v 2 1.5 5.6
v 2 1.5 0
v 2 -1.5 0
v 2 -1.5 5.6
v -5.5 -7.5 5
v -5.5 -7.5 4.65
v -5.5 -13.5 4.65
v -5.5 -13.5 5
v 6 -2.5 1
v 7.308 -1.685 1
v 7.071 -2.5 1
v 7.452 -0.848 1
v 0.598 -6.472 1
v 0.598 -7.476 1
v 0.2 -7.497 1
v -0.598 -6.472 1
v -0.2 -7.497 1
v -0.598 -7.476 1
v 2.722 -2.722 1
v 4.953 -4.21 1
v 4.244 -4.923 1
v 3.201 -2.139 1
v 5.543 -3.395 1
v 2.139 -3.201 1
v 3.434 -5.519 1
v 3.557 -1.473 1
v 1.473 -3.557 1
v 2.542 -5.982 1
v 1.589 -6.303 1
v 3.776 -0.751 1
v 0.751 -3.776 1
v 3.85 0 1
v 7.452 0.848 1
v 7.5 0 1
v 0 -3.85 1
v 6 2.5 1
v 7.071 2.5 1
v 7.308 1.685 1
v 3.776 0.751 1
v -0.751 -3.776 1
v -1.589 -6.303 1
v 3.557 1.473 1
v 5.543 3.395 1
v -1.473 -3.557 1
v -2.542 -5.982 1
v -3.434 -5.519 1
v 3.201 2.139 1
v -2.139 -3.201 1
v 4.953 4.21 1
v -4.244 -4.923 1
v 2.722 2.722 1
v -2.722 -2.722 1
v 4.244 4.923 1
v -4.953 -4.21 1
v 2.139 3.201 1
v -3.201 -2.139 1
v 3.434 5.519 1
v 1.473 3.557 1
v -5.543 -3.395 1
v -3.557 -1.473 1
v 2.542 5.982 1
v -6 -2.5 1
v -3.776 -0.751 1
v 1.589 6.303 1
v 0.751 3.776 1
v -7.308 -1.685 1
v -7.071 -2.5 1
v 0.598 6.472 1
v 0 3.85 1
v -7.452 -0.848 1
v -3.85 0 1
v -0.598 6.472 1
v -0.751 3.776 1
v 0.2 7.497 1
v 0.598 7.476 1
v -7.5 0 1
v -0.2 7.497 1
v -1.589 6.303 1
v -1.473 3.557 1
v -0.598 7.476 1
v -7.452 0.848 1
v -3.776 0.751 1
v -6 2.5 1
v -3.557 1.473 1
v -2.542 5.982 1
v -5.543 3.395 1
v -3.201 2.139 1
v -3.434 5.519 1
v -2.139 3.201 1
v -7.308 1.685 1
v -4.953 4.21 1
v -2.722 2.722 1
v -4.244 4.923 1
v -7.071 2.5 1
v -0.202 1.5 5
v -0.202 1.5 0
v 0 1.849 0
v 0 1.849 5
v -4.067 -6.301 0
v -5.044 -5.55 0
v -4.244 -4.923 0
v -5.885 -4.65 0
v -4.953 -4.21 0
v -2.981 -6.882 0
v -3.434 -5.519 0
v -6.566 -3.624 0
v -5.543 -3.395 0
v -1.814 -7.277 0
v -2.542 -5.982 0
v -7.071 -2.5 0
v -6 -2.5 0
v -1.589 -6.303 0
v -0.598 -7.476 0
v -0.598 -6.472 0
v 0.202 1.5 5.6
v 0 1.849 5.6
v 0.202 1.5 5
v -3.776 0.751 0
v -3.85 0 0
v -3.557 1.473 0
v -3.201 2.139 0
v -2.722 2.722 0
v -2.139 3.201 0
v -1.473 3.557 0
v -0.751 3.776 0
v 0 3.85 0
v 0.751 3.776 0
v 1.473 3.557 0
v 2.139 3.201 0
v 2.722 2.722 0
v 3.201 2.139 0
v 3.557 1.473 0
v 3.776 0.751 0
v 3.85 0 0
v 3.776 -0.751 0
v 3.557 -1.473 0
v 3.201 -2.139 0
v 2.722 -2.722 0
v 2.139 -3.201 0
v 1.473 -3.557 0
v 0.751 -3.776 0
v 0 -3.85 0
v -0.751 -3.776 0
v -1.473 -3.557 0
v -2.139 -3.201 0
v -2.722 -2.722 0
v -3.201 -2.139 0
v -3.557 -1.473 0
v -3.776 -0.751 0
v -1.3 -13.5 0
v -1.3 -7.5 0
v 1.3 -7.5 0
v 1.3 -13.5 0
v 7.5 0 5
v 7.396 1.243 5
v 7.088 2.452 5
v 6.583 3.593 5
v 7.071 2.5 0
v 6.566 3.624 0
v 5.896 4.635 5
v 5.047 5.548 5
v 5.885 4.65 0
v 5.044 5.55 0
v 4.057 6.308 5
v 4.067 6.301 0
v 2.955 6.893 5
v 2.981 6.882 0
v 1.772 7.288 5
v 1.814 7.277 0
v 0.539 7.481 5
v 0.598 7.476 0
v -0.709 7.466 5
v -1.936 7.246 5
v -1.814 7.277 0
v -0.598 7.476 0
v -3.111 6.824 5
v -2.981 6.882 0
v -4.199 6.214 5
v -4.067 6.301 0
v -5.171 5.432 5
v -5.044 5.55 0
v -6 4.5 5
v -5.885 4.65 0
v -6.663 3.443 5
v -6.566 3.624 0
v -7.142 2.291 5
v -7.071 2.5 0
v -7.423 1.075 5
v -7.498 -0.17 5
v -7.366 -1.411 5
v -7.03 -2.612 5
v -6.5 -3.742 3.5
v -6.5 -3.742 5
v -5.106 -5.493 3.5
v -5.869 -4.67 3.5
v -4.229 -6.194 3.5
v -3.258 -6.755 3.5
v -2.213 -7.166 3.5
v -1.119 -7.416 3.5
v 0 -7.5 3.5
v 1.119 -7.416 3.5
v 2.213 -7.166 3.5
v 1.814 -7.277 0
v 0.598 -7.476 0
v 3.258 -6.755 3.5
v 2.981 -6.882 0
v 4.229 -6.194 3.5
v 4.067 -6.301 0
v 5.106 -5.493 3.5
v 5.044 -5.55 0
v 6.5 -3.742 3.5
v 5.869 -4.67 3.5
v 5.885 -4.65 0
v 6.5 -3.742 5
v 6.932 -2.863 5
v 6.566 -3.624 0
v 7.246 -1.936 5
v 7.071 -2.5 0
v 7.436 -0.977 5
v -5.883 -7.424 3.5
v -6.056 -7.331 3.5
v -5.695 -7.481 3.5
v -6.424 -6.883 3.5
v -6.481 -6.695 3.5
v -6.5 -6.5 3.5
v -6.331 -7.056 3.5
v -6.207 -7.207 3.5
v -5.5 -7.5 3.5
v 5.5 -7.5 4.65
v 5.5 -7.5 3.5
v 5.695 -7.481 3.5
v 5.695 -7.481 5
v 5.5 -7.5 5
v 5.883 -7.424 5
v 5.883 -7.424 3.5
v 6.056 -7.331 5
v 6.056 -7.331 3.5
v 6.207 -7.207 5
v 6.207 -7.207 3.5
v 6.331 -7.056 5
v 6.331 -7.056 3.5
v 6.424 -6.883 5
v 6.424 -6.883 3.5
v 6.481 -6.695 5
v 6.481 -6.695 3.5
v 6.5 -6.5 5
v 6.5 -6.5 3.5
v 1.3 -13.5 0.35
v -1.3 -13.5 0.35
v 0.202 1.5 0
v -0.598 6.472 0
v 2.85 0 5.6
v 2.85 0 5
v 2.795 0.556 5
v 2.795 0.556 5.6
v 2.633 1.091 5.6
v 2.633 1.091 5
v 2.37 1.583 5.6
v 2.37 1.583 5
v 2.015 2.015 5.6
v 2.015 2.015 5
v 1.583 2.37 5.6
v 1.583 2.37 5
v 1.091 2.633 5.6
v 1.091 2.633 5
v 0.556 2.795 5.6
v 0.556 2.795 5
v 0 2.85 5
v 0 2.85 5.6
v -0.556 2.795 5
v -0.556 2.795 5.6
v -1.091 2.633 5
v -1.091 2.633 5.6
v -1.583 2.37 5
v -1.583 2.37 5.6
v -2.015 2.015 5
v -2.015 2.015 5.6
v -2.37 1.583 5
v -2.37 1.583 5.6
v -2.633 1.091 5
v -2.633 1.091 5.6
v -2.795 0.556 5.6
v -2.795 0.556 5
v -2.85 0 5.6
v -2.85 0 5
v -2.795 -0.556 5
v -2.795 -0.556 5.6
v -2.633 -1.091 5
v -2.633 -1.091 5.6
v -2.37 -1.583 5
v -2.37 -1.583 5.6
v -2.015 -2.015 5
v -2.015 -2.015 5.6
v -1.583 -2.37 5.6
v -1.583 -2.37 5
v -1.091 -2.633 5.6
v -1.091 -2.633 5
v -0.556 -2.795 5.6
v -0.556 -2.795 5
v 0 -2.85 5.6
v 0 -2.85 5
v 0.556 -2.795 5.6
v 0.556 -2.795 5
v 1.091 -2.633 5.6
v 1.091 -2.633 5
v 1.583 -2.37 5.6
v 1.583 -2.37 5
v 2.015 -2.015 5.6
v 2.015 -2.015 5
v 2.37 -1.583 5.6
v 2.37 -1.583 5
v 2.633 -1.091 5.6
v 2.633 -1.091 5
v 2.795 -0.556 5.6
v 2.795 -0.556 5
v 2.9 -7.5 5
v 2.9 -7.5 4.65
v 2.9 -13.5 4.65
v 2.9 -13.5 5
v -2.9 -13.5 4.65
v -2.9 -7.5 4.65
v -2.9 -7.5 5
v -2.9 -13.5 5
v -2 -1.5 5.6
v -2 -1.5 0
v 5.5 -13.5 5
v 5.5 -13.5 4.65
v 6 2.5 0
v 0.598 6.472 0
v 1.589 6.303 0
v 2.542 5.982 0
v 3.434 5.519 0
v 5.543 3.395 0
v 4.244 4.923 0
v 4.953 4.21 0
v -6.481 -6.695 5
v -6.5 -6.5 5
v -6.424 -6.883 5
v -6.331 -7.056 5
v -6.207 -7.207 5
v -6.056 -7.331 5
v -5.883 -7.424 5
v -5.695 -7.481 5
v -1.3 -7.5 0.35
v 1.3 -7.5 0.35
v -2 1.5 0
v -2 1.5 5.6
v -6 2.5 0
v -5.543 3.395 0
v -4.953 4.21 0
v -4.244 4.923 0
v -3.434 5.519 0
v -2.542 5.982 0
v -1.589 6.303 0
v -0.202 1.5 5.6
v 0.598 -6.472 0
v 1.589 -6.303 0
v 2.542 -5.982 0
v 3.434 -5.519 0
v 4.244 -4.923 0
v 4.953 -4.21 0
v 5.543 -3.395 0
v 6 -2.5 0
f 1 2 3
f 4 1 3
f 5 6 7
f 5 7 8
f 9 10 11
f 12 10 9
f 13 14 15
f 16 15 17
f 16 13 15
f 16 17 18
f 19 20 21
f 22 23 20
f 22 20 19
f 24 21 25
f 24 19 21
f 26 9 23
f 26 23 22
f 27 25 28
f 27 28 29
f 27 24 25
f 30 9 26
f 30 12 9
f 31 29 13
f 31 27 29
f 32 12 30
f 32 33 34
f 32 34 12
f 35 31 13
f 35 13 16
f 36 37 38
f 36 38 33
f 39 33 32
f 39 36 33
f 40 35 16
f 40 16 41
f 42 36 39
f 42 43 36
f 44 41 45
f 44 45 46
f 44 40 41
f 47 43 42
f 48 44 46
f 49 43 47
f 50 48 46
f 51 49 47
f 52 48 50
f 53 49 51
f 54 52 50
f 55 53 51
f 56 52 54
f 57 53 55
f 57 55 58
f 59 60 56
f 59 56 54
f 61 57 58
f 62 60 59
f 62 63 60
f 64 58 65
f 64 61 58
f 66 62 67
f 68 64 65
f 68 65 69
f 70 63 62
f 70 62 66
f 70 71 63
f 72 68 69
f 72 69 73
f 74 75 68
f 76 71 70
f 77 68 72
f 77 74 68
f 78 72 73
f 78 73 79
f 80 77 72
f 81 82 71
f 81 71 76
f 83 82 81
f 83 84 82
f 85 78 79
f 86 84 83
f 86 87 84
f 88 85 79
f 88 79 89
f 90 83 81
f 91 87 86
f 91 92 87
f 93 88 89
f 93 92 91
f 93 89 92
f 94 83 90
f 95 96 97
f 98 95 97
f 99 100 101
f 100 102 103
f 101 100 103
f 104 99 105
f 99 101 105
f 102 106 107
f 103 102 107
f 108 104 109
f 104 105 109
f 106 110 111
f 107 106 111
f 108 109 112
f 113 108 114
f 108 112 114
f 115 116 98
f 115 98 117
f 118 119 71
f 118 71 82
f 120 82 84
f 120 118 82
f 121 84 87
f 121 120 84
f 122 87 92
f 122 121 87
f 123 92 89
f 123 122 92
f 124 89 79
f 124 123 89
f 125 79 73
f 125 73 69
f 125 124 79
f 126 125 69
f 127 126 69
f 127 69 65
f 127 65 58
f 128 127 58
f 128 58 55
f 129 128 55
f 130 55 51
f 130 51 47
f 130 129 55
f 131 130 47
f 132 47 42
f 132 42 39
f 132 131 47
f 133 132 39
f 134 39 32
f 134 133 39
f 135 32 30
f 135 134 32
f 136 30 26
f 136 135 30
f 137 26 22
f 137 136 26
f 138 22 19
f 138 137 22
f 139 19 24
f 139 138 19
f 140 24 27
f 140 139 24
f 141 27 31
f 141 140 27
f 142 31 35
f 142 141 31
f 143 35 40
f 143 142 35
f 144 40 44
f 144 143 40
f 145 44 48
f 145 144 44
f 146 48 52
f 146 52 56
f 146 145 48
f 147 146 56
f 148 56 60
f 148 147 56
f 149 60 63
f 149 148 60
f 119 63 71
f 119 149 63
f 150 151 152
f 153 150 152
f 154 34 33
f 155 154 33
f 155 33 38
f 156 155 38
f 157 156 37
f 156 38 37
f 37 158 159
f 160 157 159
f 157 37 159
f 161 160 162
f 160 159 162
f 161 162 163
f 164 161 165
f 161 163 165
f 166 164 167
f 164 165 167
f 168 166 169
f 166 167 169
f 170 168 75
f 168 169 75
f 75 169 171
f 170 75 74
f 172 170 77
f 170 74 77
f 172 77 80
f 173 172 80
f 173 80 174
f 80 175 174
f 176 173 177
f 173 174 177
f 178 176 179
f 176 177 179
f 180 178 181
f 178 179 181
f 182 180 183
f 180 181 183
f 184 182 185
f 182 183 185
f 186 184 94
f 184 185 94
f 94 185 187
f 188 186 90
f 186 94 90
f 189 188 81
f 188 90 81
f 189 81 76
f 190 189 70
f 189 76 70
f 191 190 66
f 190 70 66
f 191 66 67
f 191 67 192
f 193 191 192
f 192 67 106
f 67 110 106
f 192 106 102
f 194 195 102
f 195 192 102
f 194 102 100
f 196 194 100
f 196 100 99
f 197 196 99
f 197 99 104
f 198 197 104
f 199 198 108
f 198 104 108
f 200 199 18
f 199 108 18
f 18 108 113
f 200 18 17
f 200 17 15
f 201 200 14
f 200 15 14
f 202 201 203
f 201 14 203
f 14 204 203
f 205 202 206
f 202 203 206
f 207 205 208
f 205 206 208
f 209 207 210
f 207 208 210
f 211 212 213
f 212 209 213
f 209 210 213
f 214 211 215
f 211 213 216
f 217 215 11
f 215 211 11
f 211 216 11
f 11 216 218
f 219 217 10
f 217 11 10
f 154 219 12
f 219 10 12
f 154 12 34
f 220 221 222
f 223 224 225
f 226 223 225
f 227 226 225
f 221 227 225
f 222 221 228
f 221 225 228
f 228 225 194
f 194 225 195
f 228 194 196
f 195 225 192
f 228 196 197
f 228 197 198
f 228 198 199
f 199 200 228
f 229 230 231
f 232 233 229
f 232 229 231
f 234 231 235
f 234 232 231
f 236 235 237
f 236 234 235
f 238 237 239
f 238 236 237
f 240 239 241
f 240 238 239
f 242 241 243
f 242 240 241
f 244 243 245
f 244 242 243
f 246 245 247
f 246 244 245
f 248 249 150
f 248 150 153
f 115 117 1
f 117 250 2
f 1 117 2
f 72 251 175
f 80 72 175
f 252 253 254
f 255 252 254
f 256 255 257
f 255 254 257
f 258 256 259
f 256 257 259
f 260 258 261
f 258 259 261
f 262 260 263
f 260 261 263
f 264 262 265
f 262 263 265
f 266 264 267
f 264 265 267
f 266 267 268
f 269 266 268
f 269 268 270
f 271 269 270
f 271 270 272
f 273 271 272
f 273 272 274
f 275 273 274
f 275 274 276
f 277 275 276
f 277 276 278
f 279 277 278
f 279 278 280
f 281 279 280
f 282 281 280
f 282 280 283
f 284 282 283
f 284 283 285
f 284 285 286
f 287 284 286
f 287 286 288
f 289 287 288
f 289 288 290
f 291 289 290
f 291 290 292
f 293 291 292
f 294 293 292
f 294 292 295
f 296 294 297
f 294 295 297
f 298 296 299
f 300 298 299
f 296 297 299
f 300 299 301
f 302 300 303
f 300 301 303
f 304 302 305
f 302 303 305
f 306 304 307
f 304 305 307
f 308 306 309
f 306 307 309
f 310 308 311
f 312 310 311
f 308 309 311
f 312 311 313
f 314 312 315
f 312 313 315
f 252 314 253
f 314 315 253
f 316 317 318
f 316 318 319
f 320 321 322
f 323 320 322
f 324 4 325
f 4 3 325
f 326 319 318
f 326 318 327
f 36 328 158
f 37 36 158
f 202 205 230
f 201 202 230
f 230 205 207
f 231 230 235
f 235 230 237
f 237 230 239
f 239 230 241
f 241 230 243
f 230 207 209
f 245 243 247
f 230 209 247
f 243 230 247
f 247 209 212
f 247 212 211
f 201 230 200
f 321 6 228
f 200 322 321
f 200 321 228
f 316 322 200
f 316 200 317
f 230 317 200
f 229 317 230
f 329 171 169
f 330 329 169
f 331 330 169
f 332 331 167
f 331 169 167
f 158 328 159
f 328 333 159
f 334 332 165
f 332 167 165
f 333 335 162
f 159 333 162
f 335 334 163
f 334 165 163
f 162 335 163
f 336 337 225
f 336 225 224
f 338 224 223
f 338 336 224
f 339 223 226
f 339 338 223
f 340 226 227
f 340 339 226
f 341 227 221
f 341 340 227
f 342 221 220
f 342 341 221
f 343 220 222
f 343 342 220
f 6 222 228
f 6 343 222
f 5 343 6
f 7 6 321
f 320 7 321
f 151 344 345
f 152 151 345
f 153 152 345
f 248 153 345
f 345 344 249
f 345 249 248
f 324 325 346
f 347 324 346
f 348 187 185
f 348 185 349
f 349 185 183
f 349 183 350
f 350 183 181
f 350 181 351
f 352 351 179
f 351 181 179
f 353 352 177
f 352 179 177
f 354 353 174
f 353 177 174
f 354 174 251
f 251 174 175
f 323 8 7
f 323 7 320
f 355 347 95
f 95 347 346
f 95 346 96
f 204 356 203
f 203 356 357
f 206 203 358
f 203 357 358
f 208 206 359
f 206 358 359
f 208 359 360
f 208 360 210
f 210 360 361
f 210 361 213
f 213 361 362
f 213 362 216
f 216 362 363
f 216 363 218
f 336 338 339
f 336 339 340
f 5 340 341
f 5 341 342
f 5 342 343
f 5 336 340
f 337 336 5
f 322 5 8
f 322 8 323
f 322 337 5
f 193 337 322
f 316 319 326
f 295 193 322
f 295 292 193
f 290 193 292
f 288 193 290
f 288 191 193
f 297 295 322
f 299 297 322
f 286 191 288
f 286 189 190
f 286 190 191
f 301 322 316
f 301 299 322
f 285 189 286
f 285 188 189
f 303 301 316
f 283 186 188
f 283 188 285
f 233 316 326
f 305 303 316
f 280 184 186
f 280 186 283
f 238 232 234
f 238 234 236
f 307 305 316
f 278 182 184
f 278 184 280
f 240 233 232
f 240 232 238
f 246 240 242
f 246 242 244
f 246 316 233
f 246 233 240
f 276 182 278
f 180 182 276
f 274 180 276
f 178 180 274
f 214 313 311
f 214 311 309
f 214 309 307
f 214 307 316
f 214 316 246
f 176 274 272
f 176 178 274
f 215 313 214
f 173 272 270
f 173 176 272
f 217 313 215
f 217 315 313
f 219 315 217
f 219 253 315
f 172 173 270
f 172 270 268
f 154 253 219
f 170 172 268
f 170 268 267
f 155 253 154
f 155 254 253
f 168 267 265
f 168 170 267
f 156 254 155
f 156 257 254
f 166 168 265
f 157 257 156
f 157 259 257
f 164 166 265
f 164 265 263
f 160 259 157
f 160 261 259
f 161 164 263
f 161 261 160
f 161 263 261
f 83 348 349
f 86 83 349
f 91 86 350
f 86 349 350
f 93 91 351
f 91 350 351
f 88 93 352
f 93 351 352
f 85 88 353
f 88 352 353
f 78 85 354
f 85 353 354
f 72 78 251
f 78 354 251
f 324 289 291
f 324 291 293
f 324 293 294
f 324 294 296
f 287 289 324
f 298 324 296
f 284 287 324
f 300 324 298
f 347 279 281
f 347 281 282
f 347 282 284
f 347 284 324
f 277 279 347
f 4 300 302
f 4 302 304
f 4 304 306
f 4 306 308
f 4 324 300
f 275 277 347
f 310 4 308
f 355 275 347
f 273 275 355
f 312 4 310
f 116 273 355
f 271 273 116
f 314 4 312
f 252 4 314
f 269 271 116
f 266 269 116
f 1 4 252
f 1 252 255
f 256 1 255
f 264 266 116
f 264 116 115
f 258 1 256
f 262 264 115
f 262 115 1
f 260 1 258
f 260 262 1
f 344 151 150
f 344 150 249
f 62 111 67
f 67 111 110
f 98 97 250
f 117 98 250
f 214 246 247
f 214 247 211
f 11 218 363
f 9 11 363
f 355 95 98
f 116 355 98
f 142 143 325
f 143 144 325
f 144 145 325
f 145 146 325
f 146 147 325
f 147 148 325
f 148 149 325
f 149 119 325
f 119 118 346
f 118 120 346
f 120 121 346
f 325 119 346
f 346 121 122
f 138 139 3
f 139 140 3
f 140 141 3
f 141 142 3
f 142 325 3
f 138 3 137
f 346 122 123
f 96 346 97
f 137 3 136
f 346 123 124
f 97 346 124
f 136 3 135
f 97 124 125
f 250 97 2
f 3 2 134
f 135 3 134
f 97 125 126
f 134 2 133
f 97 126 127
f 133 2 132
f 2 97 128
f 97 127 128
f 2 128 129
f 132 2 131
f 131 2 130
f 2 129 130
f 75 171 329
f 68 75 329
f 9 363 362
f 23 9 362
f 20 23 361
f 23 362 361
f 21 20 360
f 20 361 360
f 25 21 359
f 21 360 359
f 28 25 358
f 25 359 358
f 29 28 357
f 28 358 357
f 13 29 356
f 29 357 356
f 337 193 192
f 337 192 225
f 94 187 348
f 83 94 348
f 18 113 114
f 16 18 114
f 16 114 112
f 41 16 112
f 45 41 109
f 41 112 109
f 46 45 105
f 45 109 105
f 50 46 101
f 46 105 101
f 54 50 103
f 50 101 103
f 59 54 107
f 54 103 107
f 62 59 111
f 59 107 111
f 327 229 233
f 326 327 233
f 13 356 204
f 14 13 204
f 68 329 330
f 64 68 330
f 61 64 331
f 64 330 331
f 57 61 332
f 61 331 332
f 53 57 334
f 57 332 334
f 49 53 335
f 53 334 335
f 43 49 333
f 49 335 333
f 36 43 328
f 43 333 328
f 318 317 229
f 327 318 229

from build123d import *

# Parameters (mm, degrees)
SKETCH2_R           = 7.5
BOSS_EXTRUDE1_DEPTH = 5
SKETCH3_W           = 4
SKETCH3_H           = 3
CUT_EXTRUDE1_DEPTH  = 12.7260394
SKETCH4_R           = 3.85
CUT_EXTRUDE2_DEPTH  = 1
SKETCH7_R           = 2.85
BOSS_EXTRUDE2_DEPTH = 0.6
BOSS_EXTRUDE3_DEPTH = 1.5
SKETCH9_W           = 2.6
SKETCH9_H           = 0.35
BOSS_EXTRUDE4_DEPTH = 6


with BuildPart() as part:
    # Sketch2 → Boss-Extrude1 (new body)
    with BuildSketch(Plane.XY):
        Circle(SKETCH2_R)
    extrude(amount=BOSS_EXTRUDE1_DEPTH)

    # Sketch3 → Cut-Extrude1 (cut, through all)
    with BuildSketch(Plane(origin=(0, 0, 0), x_dir=(-1, 0, 0), z_dir=(0, 0, -1))):
        Polygon((0.302588522, 1.325300435), (0, 1.849399129), (-0.302588522, 1.325300435), align=None)
        Rectangle(SKETCH3_W, SKETCH3_H)
    extrude(amount=-CUT_EXTRUDE1_DEPTH, mode=Mode.SUBTRACT)

    # Sketch4 → Cut-Extrude2 (cut)
    # profile 1 of 9: a face of its own
    with BuildSketch(Plane(origin=(0, 0, 0), x_dir=(-1, 0, 0), z_dir=(0, 0, -1))):
        with BuildLine():
            Line((-7.071067812, -2.5), (-6, -2.5))
            ThreePointArc((-6, -2.5), (-6.5, 0), (-6, 2.5))
            Line((-6, 2.5), (-7.071067812, 2.5))
            ThreePointArc((-7.071067812, 2.5), (-7.5, 0), (-7.071067812, -2.5))
        make_face()
    # profile 2 of 9: a face of its own
    with BuildSketch(Plane(origin=(0, 0, 0), x_dir=(-1, 0, 0), z_dir=(0, 0, -1))):
        with BuildLine():
            Line((-6, -2.5), (-4.581631236, -2.5))
            Line((-4.581631236, -2.5), (-4.581631236, 2.5))
            Line((-4.581631236, 2.5), (-6, 2.5))
            ThreePointArc((-6, 2.5), (-6.5, 0), (-6, -2.5))
        make_face()
    # profile 3 of 9: a face of its own
    with BuildSketch(Plane(origin=(0, 0, 0), x_dir=(-1, 0, 0), z_dir=(0, 0, -1))):
        with BuildLine():
            Line((-4.581631236, 2.5), (-4.581631236, -2.5))
            Line((-4.581631236, -2.5), (-6, -2.5))
            ThreePointArc((-6, -2.5), (-3.850924227, -5.236447517), (-0.598372116, -6.472399154))
            Line((-0.598372116, -6.472399154), (-0.598372116, -5.084021936))
            Line((-0.598372116, -5.084021936), (0.598372116, -5.084021936))
            Line((0.598372116, -5.084021936), (0.598372116, -6.472399154))
            ThreePointArc((0.598372116, -6.472399154), (3.850924227, -5.236447517), (6, -2.5))
            Line((6, -2.5), (4.581631236, -2.5))
            Line((4.581631236, -2.5), (4.581631236, 2.5))
            Line((4.581631236, 2.5), (6, 2.5))
            ThreePointArc((6, 2.5), (3.850924227, 5.236447517), (0.598372116, 6.472399154))
            Line((0.598372116, 6.472399154), (0.598372116, 4.979496746))
            Line((0.598372116, 4.979496746), (-0.598372116, 4.979496746))
            Line((-0.598372116, 4.979496746), (-0.598372116, 6.472399154))
            ThreePointArc((-0.598372116, 6.472399154), (-3.850924227, 5.236447517), (-6, 2.5))
            Line((-6, 2.5), (-4.581631236, 2.5))
        make_face()
        Circle(SKETCH4_R, mode=Mode.SUBTRACT)
    # profile 4 of 9: a face of its own
    with BuildSketch(Plane(origin=(0, 0, 0), x_dir=(-1, 0, 0), z_dir=(0, 0, -1))):
        with BuildLine():
            ThreePointArc((0.598372116, 6.472399154), (0, 6.5), (-0.598372116, 6.472399154))
            Line((-0.598372116, 6.472399154), (-0.598372116, 4.979496746))
            Line((-0.598372116, 4.979496746), (0.598372116, 4.979496746))
            Line((0.598372116, 4.979496746), (0.598372116, 6.472399154))
        make_face()
    # profile 5 of 9: a face of its own
    with BuildSketch(Plane(origin=(0, 0, 0), x_dir=(-1, 0, 0), z_dir=(0, 0, -1))):
        with BuildLine():
            Line((-0.598372116, 7.476091948), (-0.598372116, 6.472399154))
            ThreePointArc((-0.598372116, 6.472399154), (0, 6.5), (0.598372116, 6.472399154))
            Line((0.598372116, 6.472399154), (0.598372116, 7.476091948))
            ThreePointArc((0.598372116, 7.476091948), (0, 7.5), (-0.598372116, 7.476091948))
        make_face()
    # profile 6 of 9: a face of its own
    with BuildSketch(Plane(origin=(0, 0, 0), x_dir=(-1, 0, 0), z_dir=(0, 0, -1))):
        with BuildLine():
            Line((4.581631236, -2.5), (6, -2.5))
            ThreePointArc((6, -2.5), (6.373774392, -1.274754878), (6.5, 0))
            ThreePointArc((6.5, 0), (6.373774392, 1.274754878), (6, 2.5))
            Line((6, 2.5), (4.581631236, 2.5))
            Line((4.581631236, 2.5), (4.581631236, -2.5))
        make_face()
    # profile 7 of 9: a face of its own
    with BuildSketch(Plane(origin=(0, 0, 0), x_dir=(-1, 0, 0), z_dir=(0, 0, -1))):
        with BuildLine():
            ThreePointArc((6.5, 0), (6.373774392, -1.274754878), (6, -2.5))
            Line((6, -2.5), (7.071067812, -2.5))
            ThreePointArc((7.071067812, -2.5), (7.391989197, -1.26826484), (7.5, 0))
            ThreePointArc((7.5, 0), (7.391989197, 1.26826484), (7.071067812, 2.5))
            Line((7.071067812, 2.5), (6, 2.5))
            ThreePointArc((6, 2.5), (6.373774392, 1.274754878), (6.5, 0))
        make_face()
    # profile 8 of 9: a face of its own
    with BuildSketch(Plane(origin=(0, 0, 0), x_dir=(-1, 0, 0), z_dir=(0, 0, -1))):
        with BuildLine():
            Line((-0.598372116, -5.084021936), (-0.598372116, -6.472399154))
            ThreePointArc((-0.598372116, -6.472399154), (0, -6.5), (0.598372116, -6.472399154))
            Line((0.598372116, -6.472399154), (0.598372116, -5.084021936))
            Line((0.598372116, -5.084021936), (-0.598372116, -5.084021936))
        make_face()
    # profile 9 of 9: a face of its own
    with BuildSketch(Plane(origin=(0, 0, 0), x_dir=(-1, 0, 0), z_dir=(0, 0, -1))):
        with BuildLine():
            ThreePointArc((0.598372116, -6.472399154), (0, -6.5), (-0.598372116, -6.472399154))
            Line((-0.598372116, -6.472399154), (-0.598372116, -7.476091948))
            ThreePointArc((-0.598372116, -7.476091948), (0, -7.5), (0.598372116, -7.476091948))
            Line((0.598372116, -7.476091948), (0.598372116, -6.472399154))
        make_face()
    extrude(amount=-CUT_EXTRUDE2_DEPTH, mode=Mode.SUBTRACT)

    # Sketch7 → Boss-Extrude2 (add)
    with BuildSketch(Plane.XY.offset(5)):
        Circle(SKETCH7_R)
        Polygon((2, -1.5), (-2, -1.5), (-2, 1.5), (-0.201725681, 1.5), (0, 1.849399129), (0.201725681, 1.5), (2, 1.5), align=None, mode=Mode.SUBTRACT)
    extrude(amount=BOSS_EXTRUDE2_DEPTH)

    # Sketch8 → Boss-Extrude3 (add)
    with BuildSketch(Plane.XY.offset(5)):
        with BuildLine():
            Line((-5.5, -7.5), (5.5, -7.5))
            ThreePointArc((5.5, -7.5), (6.207106781, -7.207106781), (6.5, -6.5))
            Line((6.5, -6.5), (6.5, -2.85))
            Line((6.5, -2.85), (-6.5, -2.85))
            Line((-6.5, -2.85), (-6.5, -6.5))
            ThreePointArc((-6.5, -6.5), (-6.207106781, -7.207106781), (-5.5, -7.5))
        make_face()
    extrude(amount=-BOSS_EXTRUDE3_DEPTH)

    # Sketch9 → Boss-Extrude4 (add)
    with BuildSketch(Plane.XZ.offset(7.5)):
        with Locations((0, 0.175)):
            Rectangle(SKETCH9_W, SKETCH9_H)
        with Locations((-4.2, 4.825)):
            Rectangle(SKETCH9_W, SKETCH9_H)
        with Locations((4.2, 4.825)):
            Rectangle(SKETCH9_W, SKETCH9_H)
    extrude(amount=BOSS_EXTRUDE4_DEPTH)


with BuildPart() as boss_extrude4_piece_1:
    # of the separate pieces the step leaves, piece 1, a body of its own (boss_extrude4_pieces)
    add(part.part.solids().sort_by_distance((7.071067812, 2.5, 0))[0])


with BuildPart() as boss_extrude4_piece_2:
    # of the separate pieces the step leaves, piece 2, a body of its own (boss_extrude4_pieces)
    add(part.part.solids().sort_by_distance((-1.3, -7.5, 0))[0])


solid = Compound([boss_extrude4_piece_1.part, boss_extrude4_piece_2.part])
